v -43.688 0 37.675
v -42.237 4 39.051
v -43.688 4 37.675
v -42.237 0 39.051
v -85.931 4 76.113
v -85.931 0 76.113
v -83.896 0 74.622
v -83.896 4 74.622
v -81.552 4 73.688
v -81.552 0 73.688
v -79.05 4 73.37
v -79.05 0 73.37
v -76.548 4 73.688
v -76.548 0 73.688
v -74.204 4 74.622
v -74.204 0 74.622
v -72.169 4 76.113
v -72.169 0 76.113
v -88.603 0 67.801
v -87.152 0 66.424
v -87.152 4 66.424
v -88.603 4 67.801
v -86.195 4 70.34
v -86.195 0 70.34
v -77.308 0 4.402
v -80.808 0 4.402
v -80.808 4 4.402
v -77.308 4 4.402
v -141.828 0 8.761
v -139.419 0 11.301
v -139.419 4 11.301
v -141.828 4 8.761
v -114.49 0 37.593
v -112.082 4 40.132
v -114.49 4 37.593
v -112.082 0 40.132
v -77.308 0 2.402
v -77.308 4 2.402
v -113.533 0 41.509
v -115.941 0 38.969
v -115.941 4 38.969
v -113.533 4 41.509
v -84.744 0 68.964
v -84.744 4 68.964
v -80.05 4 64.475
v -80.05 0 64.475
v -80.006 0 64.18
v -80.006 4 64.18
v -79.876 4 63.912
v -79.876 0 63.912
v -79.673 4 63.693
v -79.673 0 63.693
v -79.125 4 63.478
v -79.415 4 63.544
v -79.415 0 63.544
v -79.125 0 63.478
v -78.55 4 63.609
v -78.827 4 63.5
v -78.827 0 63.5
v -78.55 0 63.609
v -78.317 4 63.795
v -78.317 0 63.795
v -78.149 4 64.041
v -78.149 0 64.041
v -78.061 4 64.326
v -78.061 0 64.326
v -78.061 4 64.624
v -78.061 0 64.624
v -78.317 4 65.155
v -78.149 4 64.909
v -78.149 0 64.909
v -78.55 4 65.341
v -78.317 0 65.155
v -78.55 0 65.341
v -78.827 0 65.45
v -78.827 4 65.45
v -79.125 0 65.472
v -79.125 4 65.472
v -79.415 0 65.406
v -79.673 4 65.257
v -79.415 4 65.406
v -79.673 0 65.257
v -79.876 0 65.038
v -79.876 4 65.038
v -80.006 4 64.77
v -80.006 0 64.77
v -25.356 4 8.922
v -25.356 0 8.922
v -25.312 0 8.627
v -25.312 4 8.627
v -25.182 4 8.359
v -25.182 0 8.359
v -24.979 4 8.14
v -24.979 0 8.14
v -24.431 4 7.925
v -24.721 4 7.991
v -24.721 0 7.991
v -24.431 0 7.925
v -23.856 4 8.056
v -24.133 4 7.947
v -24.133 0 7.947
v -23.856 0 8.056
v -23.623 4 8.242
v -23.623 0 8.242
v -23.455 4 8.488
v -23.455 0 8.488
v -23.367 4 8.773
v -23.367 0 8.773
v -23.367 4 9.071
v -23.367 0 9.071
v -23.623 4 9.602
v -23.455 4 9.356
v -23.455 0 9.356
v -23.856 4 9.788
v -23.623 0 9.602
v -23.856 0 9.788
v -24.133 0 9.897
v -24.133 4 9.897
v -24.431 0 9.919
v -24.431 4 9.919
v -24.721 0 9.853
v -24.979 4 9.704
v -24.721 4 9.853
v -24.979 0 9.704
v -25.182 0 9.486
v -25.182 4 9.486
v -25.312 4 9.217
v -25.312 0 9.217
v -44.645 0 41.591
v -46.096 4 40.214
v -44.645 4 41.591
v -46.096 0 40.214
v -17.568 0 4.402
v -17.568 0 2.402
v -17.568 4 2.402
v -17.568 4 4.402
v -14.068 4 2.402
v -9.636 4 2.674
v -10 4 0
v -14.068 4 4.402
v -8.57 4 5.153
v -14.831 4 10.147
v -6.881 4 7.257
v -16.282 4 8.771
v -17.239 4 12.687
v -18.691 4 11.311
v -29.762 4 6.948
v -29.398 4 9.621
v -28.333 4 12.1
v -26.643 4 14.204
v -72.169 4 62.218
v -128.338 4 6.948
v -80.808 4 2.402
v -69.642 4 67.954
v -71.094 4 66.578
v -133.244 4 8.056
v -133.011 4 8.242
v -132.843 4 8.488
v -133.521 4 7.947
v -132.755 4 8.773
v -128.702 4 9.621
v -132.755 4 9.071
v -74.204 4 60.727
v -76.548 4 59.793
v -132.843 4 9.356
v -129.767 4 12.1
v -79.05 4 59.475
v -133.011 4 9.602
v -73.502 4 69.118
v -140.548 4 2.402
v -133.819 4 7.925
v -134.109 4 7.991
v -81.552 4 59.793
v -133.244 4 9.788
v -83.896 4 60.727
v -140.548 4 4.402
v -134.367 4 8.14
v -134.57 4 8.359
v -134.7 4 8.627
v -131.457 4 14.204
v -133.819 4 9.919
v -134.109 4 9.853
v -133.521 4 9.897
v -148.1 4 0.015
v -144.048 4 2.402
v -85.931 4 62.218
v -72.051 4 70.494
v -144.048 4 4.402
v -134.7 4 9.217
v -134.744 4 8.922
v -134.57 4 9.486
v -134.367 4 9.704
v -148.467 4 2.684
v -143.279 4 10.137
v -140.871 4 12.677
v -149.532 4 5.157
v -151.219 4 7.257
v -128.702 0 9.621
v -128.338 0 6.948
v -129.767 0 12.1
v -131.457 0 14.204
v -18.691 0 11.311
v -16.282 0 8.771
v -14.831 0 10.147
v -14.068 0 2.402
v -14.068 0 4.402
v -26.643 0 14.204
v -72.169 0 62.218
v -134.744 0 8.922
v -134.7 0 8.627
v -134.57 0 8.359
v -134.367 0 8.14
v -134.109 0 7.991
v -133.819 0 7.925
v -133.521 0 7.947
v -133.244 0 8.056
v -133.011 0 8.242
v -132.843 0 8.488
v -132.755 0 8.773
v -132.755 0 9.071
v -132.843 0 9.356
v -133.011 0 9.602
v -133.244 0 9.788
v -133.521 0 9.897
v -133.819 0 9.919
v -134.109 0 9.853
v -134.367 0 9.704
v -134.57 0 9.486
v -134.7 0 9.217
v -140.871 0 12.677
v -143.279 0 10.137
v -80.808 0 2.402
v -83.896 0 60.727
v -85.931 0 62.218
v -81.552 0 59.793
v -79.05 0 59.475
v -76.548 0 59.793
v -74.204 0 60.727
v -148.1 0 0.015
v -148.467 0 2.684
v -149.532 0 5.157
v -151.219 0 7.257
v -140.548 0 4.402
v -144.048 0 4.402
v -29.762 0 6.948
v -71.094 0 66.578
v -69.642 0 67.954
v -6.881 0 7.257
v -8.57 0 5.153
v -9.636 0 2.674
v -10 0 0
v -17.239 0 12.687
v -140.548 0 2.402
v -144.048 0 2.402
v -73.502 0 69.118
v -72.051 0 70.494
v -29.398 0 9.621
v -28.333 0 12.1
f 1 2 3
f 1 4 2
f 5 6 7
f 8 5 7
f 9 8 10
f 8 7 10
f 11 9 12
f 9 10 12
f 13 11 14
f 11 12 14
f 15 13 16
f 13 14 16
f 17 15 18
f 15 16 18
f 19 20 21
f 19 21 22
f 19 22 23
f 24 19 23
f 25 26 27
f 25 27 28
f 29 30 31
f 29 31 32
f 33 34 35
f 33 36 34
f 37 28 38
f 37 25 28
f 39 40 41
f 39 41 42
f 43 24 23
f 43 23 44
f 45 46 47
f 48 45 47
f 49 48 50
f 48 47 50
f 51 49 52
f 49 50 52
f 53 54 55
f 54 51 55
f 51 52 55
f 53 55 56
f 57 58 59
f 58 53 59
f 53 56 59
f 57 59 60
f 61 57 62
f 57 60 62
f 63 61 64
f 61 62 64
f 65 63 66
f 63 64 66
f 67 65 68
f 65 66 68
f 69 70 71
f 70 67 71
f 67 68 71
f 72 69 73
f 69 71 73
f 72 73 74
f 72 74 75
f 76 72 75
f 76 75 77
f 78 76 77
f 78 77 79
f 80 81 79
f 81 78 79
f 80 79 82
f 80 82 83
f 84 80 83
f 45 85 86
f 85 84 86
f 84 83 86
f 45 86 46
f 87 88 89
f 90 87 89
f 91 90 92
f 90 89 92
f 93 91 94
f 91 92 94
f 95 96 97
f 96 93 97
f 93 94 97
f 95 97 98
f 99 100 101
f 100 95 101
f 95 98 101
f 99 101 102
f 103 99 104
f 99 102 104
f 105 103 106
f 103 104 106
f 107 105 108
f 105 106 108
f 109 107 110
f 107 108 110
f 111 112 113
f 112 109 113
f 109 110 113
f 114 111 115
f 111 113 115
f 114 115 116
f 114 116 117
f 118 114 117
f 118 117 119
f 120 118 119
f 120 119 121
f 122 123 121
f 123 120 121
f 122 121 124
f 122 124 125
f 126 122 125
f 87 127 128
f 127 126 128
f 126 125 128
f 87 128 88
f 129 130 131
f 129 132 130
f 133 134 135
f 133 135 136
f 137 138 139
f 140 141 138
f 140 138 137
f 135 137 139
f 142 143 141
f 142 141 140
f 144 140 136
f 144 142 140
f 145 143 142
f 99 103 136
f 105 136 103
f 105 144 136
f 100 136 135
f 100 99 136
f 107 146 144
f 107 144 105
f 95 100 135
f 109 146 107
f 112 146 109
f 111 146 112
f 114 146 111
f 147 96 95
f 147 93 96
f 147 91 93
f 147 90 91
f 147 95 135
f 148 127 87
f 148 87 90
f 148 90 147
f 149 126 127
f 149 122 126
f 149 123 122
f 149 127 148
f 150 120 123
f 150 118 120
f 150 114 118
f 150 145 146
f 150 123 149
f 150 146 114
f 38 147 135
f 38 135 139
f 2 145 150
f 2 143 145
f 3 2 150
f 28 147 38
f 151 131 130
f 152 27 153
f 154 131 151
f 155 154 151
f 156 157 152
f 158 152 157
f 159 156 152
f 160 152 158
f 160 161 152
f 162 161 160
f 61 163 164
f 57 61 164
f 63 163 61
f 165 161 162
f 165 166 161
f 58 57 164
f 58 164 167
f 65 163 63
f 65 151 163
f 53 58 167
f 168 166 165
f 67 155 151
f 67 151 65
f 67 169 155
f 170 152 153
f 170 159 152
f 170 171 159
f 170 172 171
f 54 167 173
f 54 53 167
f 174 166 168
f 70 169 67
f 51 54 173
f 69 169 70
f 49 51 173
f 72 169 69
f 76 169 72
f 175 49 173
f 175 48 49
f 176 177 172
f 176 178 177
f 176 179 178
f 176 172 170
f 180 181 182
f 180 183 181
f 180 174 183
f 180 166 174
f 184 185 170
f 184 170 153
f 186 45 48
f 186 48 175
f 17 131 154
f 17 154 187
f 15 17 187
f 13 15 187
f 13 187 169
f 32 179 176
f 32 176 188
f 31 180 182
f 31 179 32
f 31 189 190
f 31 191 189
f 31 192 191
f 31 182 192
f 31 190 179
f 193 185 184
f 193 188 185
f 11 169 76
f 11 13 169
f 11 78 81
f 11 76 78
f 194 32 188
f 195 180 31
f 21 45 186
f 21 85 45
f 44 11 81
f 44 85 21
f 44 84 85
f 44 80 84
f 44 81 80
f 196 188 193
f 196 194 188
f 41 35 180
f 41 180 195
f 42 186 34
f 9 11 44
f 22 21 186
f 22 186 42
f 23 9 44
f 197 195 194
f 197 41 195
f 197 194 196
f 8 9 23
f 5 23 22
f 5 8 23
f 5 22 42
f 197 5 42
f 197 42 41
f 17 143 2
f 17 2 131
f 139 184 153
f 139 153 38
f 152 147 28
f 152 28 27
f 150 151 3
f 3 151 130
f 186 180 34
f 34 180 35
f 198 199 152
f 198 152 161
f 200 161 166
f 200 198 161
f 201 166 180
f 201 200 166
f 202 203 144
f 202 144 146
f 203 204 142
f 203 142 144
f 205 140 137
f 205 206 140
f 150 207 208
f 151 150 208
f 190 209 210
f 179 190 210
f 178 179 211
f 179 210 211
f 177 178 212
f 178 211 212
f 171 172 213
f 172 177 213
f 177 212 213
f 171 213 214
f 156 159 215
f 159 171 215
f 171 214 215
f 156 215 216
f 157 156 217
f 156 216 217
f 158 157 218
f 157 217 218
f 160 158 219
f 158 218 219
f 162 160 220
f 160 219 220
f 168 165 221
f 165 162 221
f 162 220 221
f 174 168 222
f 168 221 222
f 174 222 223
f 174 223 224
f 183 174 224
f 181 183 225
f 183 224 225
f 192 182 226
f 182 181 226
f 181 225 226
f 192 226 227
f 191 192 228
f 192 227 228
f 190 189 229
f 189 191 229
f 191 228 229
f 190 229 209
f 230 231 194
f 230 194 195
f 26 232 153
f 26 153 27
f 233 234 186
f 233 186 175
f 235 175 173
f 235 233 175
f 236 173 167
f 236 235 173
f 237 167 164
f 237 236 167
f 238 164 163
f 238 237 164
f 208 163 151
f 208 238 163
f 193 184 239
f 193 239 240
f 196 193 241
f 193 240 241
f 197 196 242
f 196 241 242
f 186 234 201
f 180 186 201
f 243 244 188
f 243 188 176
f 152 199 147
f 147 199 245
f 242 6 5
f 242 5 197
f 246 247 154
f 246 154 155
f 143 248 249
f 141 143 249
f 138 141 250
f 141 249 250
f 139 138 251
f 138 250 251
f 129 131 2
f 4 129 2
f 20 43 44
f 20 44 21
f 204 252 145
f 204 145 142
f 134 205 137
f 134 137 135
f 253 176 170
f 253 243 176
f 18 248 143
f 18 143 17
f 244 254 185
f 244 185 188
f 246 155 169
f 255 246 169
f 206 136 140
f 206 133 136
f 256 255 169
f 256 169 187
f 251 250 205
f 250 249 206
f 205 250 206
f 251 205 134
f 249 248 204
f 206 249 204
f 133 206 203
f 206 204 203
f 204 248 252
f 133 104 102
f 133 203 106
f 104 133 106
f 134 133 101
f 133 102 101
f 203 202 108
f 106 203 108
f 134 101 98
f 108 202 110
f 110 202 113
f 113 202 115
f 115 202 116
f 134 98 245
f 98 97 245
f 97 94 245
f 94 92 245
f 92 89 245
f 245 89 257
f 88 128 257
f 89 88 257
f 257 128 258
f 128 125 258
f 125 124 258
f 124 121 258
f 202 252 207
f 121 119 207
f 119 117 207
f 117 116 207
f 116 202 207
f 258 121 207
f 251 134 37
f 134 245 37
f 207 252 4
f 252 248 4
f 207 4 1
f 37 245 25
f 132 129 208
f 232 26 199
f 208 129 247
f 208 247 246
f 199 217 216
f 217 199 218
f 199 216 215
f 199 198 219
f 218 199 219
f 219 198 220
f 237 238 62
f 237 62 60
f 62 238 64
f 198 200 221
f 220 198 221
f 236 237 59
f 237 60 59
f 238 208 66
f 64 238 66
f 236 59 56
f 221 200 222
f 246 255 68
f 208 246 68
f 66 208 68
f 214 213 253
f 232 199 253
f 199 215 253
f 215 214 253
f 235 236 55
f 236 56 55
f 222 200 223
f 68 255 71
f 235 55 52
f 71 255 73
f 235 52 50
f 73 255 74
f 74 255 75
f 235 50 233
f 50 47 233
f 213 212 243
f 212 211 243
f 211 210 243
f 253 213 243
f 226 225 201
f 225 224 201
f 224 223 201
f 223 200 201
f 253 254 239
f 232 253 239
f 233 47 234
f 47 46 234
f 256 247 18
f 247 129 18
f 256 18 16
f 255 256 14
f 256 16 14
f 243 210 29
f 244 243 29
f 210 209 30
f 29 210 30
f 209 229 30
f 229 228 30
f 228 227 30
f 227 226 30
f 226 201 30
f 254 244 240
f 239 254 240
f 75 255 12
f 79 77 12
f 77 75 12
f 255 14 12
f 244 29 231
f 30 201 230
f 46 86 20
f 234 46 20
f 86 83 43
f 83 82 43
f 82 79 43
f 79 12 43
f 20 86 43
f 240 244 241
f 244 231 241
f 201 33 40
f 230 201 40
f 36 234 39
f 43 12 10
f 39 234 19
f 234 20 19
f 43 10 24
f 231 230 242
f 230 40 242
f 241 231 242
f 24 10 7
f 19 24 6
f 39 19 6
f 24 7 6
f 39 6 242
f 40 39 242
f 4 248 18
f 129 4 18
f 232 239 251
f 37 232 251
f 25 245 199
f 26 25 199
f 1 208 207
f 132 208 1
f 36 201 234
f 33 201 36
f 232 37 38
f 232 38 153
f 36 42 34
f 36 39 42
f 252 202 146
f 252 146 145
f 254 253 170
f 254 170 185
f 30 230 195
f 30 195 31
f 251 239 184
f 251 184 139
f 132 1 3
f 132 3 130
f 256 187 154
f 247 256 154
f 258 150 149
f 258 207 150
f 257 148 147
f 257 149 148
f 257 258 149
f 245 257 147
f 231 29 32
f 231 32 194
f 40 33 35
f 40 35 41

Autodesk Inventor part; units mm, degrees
ref_plane "YZ Plane" through (0, 0, 0) normal (1, 0, 0) x (0, 1, 0)
ref_plane "XZ Plane" through (0, 0, 0) normal (0, 1, 0) x (-1, 0, 0)
ref_plane "XY Plane" through (0, 0, 0) normal (0, 0, 1) x (1, 0, 0)
sketch "Sketch1" plane through (0, 0, 0) normal (0, 1, 0) x (-1, 0, 0)
  arc A0 (10, 0) -> (6.8806, 7.2566) centre (0, 0) ccw
  arc A1 (151.2194, 7.2566) -> (148.1, 0.0154) centre (158.1, 0) ccw
  arc A2 (29.7625, 6.9475) -> (26.6431, 14.2041) centre (19.7625, 6.9475) ccw
  arc A3 (131.4569, 14.2041) -> (128.3375, 6.9475) centre (138.3375, 6.9475) ccw
  arc A4 (72.1694, 62.2184) -> (85.9306, 62.2184) centre (79.05, 69.475) ccw
  circle A5 centre (79.05, 64.475) radius 1
  circle A6 centre (133.744, 8.9222) radius 1
  circle A7 centre (24.356, 8.9222) radius 1
  line L0 (26.6431, 14.2041) -> (72.1694, 62.2184)
  line L1 (85.9306, 62.2184) -> (131.4569, 14.2041)
  line L2 (128.3375, 6.9475) -> (29.7625, 6.9475)
  line L3 (6.8806, 7.2566) -> (72.1694, 76.1134)
  line L4 (85.9306, 76.1134) -> (151.2194, 7.2566)
  line L5 (148.1, 0.0154) -> (10, 0)
  arc A8 (72.1694, 76.1134) -> (85.9306, 76.1134) centre (79.05, 83.37) ccw
  line L6 (14.0684, 2.4018) -> (17.5684, 2.4018)
  line L7 (17.5684, 2.4018) -> (17.5684, 4.4018)
  line L8 (17.5684, 4.4018) -> (14.0684, 4.4018)
  line L9 (14.0684, 4.4018) -> (14.0684, 2.4018)
  line L10 (77.3084, 2.4018) -> (80.8084, 2.4018)
  line L11 (80.8084, 2.4018) -> (80.8084, 4.4018)
  line L12 (80.8084, 4.4018) -> (77.3084, 4.4018)
  line L13 (77.3084, 4.4018) -> (77.3084, 2.4018)
  line L14 (140.5484, 2.4018) -> (144.0484, 2.4018)
  line L15 (144.0484, 2.4018) -> (144.0484, 4.4018)
  line L16 (144.0484, 4.4018) -> (140.5484, 4.4018)
  line L17 (140.5484, 4.4018) -> (140.5484, 2.4018)
  line L18 (16.2824, 8.7713) -> (18.6906, 11.3111)
  line L19 (18.6906, 11.3111) -> (17.2392, 12.6872)
  line L20 (17.2392, 12.6872) -> (14.831, 10.1474)
  line L21 (14.831, 10.1474) -> (16.2824, 8.7713)
  line L22 (43.688, 37.6746) -> (46.0962, 40.2145)
  line L23 (46.0962, 40.2145) -> (44.6449, 41.5906)
  line L24 (44.6449, 41.5906) -> (42.2367, 39.0508)
  line L25 (42.2367, 39.0508) -> (43.688, 37.6746)
  line L26 (71.0937, 66.578) -> (73.5019, 69.1178)
  line L27 (73.5019, 69.1178) -> (72.0506, 70.4939)
  line L28 (72.0506, 70.4939) -> (69.6424, 67.9541)
  line L29 (69.6424, 67.9541) -> (71.0937, 66.578)
  line L30 (143.2789, 10.1369) -> (140.8707, 12.6767)
  line L31 (140.8707, 12.6767) -> (139.4194, 11.3006)
  line L32 (139.4194, 11.3006) -> (141.8276, 8.7608)
  line L33 (141.8276, 8.7608) -> (143.2789, 10.1369)
  line L34 (115.941, 38.9688) -> (113.5329, 41.5086)
  line L35 (113.5329, 41.5086) -> (112.0815, 40.1325)
  line L36 (112.0815, 40.1325) -> (114.4897, 37.5927)
  line L37 (114.4897, 37.5927) -> (115.941, 38.9688)
  line L38 (88.6032, 67.8006) -> (86.195, 70.3404)
  line L39 (86.195, 70.3404) -> (84.7437, 68.9643)
  line L40 (84.7437, 68.9643) -> (87.1519, 66.4245)
  line L41 (87.1519, 66.4245) -> (88.6032, 67.8006)
  point P0 (151.2194, 7.2566)
  point P1 (85.9306, 76.1134)
  point P2 (29.7625, 6.9475)
  point P3 (131.4569, 14.2041)
extrude "Extrusion1" add sketch "Sketch1" along normal blind 4
properties part number "aab_camera_face"
